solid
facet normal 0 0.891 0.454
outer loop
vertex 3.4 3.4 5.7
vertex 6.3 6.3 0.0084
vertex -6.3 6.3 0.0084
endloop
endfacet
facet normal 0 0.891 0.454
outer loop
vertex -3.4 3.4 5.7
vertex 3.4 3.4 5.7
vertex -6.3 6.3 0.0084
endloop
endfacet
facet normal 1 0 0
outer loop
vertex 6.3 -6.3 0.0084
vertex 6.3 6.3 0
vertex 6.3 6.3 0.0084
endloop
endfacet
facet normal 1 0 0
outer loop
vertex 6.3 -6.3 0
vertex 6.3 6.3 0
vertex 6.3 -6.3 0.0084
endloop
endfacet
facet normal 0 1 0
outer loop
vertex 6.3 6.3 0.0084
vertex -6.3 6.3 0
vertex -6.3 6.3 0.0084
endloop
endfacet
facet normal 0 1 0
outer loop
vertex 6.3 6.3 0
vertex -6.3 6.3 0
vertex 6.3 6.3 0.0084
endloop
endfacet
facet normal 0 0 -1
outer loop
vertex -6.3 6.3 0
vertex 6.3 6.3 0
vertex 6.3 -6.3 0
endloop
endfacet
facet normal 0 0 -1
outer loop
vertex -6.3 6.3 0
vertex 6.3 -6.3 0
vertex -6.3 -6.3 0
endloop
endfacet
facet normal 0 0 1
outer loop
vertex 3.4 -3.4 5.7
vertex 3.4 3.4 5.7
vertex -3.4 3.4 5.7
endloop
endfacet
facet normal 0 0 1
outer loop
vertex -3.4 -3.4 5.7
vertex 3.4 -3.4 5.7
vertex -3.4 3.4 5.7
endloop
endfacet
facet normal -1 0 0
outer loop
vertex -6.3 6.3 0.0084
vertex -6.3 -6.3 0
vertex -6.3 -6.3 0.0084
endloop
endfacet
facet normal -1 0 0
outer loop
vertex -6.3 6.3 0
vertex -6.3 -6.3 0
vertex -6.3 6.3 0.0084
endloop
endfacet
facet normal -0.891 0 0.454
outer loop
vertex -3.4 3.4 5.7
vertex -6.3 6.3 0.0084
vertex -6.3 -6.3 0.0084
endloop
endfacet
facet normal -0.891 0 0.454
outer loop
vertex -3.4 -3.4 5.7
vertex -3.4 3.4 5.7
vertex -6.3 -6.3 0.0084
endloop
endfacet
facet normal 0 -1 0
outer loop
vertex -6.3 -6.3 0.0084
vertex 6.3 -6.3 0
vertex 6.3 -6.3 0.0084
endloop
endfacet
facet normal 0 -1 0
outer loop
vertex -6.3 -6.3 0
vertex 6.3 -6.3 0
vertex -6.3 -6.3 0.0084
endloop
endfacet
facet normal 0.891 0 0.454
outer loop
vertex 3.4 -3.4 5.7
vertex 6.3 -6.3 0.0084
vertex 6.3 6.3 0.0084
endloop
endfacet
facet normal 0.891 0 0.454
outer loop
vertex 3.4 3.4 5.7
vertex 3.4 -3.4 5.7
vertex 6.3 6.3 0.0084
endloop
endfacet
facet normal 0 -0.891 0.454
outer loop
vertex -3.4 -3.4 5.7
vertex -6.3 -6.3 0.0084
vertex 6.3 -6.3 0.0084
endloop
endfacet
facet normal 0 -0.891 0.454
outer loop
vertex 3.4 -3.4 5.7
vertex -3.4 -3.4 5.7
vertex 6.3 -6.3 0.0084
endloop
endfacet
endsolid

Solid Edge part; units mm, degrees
sketch "Sketch1" plane through (0, 0, 0) normal (0, 0, 1) x (1, 0, 0)
  line L0 (6.3, 6.3) -> (6.3, -6.3)
  line L1 (6.3, -6.3) -> (-6.3, -6.3)
  line L2 (-6.3, -6.3) -> (-6.3, 6.3)
  line L3 (-6.3, 6.3) -> (6.3, 6.3)
extrude "Protrusion1" add sketch "Sketch1" along normal blind 5.7
chamfer "Chanfrein_1" distance 2.9 angle 63 4 edges at (0, -6.3, 5.7) (6.3, 0, 5.7) (0, 6.3, 5.7) (-6.3, 0, 5.7) measured on face at (4.326, -4.074, 5.7)
